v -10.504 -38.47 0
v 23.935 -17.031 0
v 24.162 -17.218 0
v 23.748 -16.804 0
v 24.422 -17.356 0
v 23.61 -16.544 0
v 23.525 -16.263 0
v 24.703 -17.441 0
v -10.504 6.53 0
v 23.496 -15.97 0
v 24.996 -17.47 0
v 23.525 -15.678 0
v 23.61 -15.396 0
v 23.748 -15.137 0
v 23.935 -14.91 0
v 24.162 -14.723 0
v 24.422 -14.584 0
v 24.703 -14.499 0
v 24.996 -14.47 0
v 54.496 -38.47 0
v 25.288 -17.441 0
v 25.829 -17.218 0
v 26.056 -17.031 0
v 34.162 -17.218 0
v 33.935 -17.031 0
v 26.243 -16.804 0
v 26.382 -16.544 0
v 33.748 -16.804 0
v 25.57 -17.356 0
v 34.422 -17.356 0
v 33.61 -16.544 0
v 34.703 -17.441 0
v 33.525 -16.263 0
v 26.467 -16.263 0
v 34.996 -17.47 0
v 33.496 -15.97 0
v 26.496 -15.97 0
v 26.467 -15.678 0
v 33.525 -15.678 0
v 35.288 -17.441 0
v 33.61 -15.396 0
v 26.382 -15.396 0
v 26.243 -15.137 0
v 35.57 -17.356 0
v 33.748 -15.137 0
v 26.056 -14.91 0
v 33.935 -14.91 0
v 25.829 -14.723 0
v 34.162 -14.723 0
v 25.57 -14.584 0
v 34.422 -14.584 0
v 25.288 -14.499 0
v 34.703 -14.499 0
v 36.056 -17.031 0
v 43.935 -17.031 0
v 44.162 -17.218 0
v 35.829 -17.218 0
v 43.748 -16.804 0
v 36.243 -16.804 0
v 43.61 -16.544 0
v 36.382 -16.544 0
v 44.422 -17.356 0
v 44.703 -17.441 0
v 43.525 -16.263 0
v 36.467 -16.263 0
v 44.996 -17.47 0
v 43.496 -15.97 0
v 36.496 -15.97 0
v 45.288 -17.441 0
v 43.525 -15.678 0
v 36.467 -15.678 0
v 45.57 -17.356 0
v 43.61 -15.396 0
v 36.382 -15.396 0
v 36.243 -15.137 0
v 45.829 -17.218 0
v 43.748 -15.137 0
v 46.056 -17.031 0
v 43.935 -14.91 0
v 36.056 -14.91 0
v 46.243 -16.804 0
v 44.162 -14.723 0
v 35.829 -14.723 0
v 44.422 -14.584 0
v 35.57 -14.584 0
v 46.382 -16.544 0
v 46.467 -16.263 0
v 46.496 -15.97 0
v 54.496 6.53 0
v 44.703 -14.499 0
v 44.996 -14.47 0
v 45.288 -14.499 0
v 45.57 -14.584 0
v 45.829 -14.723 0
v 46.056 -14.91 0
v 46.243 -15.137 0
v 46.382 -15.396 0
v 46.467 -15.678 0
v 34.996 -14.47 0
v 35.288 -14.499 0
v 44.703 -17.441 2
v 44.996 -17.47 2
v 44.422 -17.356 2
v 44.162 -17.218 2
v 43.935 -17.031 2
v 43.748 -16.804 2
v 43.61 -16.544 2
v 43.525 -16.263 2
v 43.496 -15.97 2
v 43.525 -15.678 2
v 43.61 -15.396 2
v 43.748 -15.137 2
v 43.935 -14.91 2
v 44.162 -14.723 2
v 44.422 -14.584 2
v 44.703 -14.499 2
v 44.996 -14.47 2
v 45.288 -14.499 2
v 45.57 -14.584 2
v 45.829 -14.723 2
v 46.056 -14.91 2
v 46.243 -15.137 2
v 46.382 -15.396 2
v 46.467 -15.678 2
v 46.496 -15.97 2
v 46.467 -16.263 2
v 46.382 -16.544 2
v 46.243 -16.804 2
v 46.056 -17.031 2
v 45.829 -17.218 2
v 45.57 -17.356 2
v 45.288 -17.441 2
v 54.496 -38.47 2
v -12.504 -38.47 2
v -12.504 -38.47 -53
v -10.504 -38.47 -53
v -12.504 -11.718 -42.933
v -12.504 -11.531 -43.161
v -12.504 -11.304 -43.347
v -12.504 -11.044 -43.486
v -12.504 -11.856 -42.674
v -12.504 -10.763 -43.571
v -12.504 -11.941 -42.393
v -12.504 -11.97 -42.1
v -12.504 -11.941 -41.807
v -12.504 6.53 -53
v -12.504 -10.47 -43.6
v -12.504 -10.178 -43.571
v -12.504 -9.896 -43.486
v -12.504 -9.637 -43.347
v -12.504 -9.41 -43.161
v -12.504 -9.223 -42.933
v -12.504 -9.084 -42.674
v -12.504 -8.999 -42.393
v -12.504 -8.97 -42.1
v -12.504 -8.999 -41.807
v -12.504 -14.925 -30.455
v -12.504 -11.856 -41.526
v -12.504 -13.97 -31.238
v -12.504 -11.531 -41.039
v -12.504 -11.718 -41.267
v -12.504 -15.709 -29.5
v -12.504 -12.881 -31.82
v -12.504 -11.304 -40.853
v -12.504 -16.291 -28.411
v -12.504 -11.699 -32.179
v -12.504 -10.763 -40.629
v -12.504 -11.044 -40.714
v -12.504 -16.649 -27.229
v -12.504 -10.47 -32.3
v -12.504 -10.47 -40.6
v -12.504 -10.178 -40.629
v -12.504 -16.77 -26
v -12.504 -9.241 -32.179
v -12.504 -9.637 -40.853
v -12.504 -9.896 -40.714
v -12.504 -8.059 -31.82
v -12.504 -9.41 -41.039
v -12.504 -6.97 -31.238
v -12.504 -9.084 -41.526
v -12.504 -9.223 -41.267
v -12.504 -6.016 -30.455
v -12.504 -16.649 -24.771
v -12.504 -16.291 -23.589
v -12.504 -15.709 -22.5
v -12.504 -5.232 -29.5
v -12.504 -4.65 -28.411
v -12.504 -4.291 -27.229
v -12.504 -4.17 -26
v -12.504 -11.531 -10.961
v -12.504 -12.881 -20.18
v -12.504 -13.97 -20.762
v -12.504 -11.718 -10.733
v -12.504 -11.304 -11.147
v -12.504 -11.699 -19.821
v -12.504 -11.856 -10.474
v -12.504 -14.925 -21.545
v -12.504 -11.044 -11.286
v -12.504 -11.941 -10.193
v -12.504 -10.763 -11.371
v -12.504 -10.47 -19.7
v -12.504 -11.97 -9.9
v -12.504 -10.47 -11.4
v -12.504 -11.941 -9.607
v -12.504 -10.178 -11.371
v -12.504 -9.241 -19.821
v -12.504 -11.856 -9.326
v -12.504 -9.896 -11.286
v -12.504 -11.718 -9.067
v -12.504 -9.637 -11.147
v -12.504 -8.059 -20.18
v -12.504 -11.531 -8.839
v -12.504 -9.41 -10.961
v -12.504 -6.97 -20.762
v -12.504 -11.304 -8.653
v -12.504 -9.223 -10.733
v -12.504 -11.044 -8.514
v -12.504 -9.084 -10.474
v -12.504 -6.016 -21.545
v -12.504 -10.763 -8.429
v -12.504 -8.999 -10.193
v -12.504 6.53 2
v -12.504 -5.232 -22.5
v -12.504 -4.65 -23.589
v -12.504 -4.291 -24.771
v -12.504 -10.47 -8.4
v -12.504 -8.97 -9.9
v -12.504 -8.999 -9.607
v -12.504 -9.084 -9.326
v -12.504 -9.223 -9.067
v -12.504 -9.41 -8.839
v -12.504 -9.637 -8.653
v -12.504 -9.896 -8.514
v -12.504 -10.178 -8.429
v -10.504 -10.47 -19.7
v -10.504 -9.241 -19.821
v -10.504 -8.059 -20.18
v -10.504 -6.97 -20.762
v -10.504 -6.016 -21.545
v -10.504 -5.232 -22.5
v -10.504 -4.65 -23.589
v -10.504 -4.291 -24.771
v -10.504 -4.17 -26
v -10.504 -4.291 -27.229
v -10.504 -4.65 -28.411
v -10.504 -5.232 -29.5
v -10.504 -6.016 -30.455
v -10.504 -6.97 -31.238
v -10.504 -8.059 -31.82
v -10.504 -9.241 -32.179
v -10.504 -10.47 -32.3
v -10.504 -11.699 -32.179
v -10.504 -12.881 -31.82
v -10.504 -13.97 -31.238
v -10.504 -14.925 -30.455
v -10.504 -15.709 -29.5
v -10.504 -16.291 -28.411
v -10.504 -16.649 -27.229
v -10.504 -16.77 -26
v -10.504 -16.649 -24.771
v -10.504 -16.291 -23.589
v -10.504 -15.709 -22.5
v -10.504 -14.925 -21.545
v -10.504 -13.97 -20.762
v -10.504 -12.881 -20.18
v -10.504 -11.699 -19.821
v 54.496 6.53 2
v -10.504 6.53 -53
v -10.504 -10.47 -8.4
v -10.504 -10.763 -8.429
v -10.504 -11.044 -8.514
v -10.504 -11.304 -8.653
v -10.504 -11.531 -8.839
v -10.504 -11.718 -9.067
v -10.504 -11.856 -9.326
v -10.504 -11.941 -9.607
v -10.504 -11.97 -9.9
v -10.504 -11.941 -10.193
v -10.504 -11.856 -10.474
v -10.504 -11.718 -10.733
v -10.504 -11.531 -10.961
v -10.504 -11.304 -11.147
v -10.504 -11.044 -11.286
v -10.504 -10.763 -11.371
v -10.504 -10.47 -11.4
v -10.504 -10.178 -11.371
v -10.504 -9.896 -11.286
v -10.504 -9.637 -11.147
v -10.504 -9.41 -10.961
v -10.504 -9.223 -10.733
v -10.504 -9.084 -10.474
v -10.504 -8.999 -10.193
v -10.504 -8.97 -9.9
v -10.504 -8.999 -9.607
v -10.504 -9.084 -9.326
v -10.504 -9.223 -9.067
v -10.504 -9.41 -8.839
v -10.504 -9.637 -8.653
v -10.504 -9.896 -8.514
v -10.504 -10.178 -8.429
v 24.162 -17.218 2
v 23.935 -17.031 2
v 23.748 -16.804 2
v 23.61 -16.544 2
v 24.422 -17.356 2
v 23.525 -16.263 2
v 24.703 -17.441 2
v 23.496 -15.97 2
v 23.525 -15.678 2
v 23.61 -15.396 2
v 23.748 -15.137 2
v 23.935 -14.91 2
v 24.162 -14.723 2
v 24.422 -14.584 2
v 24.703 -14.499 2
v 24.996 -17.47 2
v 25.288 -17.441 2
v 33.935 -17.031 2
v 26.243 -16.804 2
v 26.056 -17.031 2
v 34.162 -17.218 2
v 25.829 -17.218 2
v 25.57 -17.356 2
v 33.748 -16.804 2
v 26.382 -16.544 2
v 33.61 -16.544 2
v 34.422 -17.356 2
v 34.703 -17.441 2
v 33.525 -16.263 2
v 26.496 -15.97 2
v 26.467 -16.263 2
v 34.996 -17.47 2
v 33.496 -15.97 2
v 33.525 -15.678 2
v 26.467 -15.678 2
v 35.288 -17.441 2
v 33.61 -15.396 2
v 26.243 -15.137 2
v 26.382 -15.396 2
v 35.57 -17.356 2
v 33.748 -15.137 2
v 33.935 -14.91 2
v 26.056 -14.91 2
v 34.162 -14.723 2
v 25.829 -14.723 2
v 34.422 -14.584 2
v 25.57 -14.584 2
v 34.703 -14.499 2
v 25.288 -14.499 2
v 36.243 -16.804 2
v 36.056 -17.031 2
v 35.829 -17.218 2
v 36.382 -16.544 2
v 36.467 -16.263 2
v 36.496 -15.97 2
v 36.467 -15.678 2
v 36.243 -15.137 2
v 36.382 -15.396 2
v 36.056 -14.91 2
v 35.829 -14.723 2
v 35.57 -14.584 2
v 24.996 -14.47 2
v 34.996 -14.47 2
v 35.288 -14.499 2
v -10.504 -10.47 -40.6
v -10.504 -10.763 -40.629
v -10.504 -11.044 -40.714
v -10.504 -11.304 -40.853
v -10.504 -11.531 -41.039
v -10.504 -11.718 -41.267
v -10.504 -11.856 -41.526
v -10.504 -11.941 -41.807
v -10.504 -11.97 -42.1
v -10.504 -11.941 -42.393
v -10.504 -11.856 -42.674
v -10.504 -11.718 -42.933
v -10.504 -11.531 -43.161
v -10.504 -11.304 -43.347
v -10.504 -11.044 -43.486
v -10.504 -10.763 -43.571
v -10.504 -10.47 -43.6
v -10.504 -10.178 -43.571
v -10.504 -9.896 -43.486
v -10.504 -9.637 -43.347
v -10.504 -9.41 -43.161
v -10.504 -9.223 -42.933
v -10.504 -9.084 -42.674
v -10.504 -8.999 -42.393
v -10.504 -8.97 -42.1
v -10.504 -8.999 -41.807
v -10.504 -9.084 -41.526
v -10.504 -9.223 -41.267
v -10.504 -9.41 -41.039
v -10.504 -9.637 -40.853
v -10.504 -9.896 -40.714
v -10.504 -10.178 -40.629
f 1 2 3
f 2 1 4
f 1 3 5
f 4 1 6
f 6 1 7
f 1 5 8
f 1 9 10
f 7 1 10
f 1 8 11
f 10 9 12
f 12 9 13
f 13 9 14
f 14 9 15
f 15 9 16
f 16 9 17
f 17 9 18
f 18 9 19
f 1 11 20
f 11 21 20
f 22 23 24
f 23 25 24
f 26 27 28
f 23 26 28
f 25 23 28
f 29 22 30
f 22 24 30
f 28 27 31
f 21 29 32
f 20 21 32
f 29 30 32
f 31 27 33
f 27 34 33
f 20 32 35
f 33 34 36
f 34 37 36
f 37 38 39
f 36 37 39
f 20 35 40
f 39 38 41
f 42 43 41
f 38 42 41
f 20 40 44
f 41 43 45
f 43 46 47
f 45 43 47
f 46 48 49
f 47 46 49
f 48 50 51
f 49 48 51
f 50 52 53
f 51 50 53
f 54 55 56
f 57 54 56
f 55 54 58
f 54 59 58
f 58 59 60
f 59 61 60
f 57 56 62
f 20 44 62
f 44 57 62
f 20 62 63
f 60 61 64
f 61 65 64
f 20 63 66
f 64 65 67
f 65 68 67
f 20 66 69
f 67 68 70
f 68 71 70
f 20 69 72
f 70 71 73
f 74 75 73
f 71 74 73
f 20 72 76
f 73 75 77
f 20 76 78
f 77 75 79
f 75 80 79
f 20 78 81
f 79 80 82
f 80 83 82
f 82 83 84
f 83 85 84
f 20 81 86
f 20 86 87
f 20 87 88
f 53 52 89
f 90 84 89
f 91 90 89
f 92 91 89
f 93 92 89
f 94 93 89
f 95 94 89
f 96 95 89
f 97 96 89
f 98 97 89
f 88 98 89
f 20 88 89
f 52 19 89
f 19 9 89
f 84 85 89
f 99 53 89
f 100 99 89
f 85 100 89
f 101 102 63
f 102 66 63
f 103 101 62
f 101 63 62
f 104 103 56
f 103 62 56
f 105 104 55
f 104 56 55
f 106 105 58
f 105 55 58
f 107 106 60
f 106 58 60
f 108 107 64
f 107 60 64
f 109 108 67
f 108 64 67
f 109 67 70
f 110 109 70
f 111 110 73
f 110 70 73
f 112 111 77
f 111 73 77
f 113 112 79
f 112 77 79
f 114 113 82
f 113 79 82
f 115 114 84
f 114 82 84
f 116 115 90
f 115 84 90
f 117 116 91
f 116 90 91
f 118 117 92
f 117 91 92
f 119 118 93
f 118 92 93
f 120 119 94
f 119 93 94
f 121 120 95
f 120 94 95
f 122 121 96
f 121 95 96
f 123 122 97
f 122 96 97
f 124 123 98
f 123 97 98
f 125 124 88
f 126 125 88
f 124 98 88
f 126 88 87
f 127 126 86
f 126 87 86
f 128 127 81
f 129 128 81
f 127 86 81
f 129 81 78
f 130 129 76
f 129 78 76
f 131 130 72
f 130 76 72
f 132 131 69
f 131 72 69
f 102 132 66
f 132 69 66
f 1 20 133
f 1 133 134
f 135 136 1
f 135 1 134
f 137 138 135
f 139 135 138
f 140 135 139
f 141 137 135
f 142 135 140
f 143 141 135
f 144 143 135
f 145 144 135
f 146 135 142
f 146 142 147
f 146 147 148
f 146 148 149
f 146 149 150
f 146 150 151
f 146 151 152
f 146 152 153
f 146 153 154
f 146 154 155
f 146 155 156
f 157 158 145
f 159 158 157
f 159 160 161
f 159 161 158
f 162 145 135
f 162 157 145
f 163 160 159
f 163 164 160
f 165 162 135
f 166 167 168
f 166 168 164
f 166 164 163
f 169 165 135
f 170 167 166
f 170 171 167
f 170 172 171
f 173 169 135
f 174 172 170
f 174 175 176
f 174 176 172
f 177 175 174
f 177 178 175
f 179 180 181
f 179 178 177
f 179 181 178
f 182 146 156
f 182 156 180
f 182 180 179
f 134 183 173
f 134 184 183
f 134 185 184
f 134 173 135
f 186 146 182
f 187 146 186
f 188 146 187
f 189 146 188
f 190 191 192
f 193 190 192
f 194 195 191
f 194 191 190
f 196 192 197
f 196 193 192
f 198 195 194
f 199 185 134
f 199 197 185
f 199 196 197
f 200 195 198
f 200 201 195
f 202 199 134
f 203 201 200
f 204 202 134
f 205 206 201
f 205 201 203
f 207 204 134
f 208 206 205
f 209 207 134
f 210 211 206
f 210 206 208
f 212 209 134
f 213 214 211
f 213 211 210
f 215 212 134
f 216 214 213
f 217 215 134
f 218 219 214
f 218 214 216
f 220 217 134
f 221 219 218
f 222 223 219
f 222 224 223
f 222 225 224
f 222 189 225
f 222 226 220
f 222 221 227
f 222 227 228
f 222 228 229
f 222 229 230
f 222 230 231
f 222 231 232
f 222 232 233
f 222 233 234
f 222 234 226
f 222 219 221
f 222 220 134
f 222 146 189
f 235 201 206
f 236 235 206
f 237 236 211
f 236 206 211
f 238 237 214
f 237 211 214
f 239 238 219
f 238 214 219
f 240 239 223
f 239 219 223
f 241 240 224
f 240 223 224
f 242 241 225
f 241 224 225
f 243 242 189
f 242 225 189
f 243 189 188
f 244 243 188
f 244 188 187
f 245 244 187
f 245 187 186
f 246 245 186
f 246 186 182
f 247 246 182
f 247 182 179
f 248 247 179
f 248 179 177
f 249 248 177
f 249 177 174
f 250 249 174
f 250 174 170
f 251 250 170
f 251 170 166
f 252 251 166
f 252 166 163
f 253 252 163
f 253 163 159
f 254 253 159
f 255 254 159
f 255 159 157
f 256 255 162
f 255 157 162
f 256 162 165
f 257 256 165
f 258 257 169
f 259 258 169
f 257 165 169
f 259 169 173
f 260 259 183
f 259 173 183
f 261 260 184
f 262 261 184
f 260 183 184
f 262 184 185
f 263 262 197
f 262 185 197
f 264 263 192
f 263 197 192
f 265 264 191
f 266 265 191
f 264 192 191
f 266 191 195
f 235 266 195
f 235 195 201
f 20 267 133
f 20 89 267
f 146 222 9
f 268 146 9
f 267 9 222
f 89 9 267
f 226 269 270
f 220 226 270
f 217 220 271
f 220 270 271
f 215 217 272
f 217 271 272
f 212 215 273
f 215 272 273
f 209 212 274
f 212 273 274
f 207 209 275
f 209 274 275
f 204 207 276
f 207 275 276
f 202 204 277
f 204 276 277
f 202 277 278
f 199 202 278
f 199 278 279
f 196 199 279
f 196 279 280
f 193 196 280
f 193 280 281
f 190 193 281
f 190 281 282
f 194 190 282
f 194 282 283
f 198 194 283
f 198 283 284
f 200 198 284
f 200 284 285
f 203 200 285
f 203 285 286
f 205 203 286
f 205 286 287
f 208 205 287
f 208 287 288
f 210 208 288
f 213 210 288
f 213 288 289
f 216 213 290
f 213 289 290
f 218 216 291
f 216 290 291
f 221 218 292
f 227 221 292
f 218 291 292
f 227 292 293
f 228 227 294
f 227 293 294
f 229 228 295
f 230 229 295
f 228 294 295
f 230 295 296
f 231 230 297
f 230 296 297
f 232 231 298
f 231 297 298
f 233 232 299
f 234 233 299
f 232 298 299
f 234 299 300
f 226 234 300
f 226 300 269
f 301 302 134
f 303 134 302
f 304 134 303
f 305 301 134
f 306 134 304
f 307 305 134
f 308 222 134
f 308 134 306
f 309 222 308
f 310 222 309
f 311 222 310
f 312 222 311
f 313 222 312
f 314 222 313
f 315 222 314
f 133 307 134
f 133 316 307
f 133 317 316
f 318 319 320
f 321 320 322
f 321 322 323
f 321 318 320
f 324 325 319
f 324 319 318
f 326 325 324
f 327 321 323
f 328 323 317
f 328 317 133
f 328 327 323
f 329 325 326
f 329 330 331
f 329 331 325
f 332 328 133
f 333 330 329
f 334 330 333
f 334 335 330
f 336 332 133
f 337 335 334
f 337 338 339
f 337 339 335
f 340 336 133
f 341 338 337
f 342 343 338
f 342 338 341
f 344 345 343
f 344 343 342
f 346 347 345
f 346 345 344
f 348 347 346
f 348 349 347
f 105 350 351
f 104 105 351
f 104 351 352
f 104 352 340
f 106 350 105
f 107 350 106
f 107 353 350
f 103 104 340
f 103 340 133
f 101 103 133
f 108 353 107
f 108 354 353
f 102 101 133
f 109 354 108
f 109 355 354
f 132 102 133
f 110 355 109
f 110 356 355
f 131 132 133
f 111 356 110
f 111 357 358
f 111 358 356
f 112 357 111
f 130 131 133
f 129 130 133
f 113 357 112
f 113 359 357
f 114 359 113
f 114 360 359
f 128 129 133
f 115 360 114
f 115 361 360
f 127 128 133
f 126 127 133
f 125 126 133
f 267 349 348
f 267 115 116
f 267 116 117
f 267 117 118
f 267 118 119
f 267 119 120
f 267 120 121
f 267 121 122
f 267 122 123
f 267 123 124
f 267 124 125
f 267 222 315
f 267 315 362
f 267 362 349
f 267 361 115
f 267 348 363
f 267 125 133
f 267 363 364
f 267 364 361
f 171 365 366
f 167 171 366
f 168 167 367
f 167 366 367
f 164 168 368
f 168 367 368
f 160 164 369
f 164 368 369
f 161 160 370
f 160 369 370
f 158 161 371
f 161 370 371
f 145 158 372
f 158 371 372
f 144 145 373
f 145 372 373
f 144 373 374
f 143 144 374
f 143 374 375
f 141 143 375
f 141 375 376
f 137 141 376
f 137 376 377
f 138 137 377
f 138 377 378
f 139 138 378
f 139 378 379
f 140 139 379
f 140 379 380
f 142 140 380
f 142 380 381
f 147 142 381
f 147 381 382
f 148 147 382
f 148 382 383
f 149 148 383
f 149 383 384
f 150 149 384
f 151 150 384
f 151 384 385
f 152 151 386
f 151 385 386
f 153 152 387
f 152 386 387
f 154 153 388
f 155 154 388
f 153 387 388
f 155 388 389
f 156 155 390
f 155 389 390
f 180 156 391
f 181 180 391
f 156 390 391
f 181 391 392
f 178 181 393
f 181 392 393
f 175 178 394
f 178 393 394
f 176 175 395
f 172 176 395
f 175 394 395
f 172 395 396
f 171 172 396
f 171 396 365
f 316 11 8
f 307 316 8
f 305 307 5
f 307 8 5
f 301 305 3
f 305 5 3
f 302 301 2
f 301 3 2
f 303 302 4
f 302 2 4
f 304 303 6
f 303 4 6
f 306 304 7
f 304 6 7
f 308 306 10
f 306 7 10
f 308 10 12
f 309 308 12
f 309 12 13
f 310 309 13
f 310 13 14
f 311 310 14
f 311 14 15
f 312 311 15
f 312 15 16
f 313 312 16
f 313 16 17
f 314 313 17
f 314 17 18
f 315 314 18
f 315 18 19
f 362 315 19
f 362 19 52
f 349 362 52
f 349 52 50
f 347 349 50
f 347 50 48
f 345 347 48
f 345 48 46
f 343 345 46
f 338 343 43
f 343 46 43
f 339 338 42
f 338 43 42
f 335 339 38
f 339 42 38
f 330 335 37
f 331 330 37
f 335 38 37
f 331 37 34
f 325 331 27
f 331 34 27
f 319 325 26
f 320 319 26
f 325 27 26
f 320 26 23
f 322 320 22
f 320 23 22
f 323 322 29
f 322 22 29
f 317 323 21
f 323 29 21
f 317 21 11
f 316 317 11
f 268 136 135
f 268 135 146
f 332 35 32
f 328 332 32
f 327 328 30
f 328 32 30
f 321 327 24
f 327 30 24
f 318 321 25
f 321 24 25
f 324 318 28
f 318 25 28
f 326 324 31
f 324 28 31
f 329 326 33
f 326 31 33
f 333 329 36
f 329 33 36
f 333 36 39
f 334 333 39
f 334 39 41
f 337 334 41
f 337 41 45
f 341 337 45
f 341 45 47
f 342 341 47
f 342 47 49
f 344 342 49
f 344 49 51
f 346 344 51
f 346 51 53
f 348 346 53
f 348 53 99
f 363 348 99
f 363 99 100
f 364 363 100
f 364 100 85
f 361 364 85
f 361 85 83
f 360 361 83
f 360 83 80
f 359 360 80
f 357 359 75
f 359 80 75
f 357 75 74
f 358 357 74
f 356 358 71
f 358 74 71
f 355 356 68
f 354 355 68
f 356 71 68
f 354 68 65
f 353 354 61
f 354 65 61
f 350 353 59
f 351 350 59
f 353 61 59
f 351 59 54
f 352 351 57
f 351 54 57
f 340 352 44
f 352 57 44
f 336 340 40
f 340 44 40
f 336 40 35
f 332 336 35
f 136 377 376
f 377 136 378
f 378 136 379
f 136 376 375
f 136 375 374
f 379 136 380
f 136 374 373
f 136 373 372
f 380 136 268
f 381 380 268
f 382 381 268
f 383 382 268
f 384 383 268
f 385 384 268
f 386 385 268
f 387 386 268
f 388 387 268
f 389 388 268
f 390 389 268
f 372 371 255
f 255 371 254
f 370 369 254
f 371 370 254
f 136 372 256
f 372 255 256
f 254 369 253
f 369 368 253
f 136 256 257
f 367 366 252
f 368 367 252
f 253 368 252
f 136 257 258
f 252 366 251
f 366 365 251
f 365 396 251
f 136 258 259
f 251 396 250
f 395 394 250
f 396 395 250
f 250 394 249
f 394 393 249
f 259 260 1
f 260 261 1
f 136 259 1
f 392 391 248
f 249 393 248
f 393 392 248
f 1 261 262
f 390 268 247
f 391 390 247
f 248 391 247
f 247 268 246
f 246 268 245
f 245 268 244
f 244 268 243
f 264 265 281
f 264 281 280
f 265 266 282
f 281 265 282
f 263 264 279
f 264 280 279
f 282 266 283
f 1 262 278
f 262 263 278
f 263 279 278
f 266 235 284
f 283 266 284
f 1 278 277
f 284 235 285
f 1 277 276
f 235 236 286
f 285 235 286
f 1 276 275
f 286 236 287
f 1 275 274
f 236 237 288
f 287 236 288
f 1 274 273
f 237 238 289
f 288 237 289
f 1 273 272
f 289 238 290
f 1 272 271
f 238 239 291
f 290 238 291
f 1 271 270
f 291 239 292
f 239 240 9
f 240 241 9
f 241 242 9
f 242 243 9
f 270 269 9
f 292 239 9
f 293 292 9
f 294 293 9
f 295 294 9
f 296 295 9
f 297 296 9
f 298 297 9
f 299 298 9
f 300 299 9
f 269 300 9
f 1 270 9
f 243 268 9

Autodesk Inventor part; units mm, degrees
ref_plane "YZ Plane" through (0, 0, 0) normal (1, 0, 0) x (0, 1, 0)
ref_plane "XZ Plane" through (0, 0, 0) normal (0, 1, 0) x (-1, 0, 0)
ref_plane "XY Plane" through (0, 0, 0) normal (0, 0, 1) x (1, 0, 0)
sketch "スケッチ1" plane through (0, 0, 0) normal (0, 0, 1) x (1, 0, 0)
  line L0 (-10.5043, 6.5297) -> (54.4957, 6.5297)
  line L1 (54.4957, 6.5297) -> (54.4957, -38.4703)
  line L2 (54.4957, -38.4703) -> (-10.5043, -38.4703)
  line L3 (-10.5043, -38.4703) -> (-10.5043, 6.5297)
  point P0 (0, 0)
  dimension "d0" = 65
  dimension "d1" = 45
extrude "押し出し1" add sketch "スケッチ1" along normal blind 2
sketch "スケッチ2" plane through (-10.5043, -38.4703, 0) normal (-1, 0, 0) x (0, 0, 1)
  line L0 (-53, 45) -> (2, 45)
  line L1 (2, 45) -> (2, 0)
  line L2 (2, 0) -> (-53, 0)
  line L3 (-53, 0) -> (-53, 45)
  point P0 (0, 38.4703)
  point P1 (2, 45)
  dimension "d4" = 55
  dimension "d5" = 45
extrude "押し出し2" add sketch "スケッチ2" along normal blind 2
sketch "スケッチ3" plane through (-12.5043, -38.4703, 0) normal (-1, 0, 0) x (0, 0, 1)
  circle A0 centre (-26, 28) radius 6.3
  line L0 (2, 45) -> (-53, 45) projected
  line L1 (-53, 0) -> (2, 0) projected
  line L2 (-53, 45) -> (-53, 0) projected
  point P0 (0, 38.4703)
  dimension "d8" = 12.6
  dimension "d10" = 28
  dimension "d11" = 27
extrude "押し出し3" cut sketch "スケッチ3" against normal blind 2
sketch "スケッチ4" plane through (-12.5043, -38.4703, 0) normal (-1, 0, 0) x (0, 0, 1)
  circle A0 centre (-42.1, 28) radius 1.5
  circle A1 centre (-26, 28) radius 6.3 projected
  line L0 (-53, 0) -> (2, 0) projected
  circle A2 centre (-9.9, 28) radius 1.5
  point P0 (0, 38.4703)
  dimension "d14" = 3
  dimension "d15" = 16.1
  dimension "d16" = 28
  dimension "d17" = 3
  dimension "d18" = 16.1
hole "穴1" at (-12.5043, -10.4703, -42.1) at (-12.5043, -10.4703, -9.9) direction (1, 0, 0) diameter 3 depth 2
sketch "スケッチ5" plane through (0, 0, 2) normal (0, 0, 1) x (1, 0, 0)
  circle A0 centre (44.9957, -15.9703) radius 1.5
  line L0 (54.4957, -38.4703) -> (54.4957, 6.5297) projected
  line L1 (54.4957, 6.5297) -> (-12.5043, 6.5297) projected
  circle A1 centre (34.9957, -15.9703) radius 1.5
  circle A2 centre (24.9957, -15.9703) radius 1.5
  point P0 (0, 0)
  dimension "d26" = 3
  dimension "d27" = 9.5
  dimension "d28" = 22.5
  dimension "d29" = 3
  dimension "d30" = 3
  dimension "d31" = 10
  dimension "d32" = 10
hole "穴2" at (24.9957, -15.9703, 2) at (34.9957, -15.9703, 2) at (44.9957, -15.9703, 2) direction (0, 0, -1) diameter 3 depth 2
equation "\"BendRadius\" = Thickness"
equation "\"BendReliefWidth\" = Thickness"
equation "\"BendReliefDepth\" = 0.5 * Thickness"
equation "\"CornerReliefSize\" = 4 * Thickness"
equation "\"MinimumRemnant\" = 2 * Thickness"
equation "\"TransitionRadius\" = BendRadius"
equation "\"JacobiRadiusSize\" = BendRadius"
equation "\"GapSize\" = Thickness"
equation "\"Thickness\" = 0.5"
properties part number "nhk16" material "アルミニウム 6061"
